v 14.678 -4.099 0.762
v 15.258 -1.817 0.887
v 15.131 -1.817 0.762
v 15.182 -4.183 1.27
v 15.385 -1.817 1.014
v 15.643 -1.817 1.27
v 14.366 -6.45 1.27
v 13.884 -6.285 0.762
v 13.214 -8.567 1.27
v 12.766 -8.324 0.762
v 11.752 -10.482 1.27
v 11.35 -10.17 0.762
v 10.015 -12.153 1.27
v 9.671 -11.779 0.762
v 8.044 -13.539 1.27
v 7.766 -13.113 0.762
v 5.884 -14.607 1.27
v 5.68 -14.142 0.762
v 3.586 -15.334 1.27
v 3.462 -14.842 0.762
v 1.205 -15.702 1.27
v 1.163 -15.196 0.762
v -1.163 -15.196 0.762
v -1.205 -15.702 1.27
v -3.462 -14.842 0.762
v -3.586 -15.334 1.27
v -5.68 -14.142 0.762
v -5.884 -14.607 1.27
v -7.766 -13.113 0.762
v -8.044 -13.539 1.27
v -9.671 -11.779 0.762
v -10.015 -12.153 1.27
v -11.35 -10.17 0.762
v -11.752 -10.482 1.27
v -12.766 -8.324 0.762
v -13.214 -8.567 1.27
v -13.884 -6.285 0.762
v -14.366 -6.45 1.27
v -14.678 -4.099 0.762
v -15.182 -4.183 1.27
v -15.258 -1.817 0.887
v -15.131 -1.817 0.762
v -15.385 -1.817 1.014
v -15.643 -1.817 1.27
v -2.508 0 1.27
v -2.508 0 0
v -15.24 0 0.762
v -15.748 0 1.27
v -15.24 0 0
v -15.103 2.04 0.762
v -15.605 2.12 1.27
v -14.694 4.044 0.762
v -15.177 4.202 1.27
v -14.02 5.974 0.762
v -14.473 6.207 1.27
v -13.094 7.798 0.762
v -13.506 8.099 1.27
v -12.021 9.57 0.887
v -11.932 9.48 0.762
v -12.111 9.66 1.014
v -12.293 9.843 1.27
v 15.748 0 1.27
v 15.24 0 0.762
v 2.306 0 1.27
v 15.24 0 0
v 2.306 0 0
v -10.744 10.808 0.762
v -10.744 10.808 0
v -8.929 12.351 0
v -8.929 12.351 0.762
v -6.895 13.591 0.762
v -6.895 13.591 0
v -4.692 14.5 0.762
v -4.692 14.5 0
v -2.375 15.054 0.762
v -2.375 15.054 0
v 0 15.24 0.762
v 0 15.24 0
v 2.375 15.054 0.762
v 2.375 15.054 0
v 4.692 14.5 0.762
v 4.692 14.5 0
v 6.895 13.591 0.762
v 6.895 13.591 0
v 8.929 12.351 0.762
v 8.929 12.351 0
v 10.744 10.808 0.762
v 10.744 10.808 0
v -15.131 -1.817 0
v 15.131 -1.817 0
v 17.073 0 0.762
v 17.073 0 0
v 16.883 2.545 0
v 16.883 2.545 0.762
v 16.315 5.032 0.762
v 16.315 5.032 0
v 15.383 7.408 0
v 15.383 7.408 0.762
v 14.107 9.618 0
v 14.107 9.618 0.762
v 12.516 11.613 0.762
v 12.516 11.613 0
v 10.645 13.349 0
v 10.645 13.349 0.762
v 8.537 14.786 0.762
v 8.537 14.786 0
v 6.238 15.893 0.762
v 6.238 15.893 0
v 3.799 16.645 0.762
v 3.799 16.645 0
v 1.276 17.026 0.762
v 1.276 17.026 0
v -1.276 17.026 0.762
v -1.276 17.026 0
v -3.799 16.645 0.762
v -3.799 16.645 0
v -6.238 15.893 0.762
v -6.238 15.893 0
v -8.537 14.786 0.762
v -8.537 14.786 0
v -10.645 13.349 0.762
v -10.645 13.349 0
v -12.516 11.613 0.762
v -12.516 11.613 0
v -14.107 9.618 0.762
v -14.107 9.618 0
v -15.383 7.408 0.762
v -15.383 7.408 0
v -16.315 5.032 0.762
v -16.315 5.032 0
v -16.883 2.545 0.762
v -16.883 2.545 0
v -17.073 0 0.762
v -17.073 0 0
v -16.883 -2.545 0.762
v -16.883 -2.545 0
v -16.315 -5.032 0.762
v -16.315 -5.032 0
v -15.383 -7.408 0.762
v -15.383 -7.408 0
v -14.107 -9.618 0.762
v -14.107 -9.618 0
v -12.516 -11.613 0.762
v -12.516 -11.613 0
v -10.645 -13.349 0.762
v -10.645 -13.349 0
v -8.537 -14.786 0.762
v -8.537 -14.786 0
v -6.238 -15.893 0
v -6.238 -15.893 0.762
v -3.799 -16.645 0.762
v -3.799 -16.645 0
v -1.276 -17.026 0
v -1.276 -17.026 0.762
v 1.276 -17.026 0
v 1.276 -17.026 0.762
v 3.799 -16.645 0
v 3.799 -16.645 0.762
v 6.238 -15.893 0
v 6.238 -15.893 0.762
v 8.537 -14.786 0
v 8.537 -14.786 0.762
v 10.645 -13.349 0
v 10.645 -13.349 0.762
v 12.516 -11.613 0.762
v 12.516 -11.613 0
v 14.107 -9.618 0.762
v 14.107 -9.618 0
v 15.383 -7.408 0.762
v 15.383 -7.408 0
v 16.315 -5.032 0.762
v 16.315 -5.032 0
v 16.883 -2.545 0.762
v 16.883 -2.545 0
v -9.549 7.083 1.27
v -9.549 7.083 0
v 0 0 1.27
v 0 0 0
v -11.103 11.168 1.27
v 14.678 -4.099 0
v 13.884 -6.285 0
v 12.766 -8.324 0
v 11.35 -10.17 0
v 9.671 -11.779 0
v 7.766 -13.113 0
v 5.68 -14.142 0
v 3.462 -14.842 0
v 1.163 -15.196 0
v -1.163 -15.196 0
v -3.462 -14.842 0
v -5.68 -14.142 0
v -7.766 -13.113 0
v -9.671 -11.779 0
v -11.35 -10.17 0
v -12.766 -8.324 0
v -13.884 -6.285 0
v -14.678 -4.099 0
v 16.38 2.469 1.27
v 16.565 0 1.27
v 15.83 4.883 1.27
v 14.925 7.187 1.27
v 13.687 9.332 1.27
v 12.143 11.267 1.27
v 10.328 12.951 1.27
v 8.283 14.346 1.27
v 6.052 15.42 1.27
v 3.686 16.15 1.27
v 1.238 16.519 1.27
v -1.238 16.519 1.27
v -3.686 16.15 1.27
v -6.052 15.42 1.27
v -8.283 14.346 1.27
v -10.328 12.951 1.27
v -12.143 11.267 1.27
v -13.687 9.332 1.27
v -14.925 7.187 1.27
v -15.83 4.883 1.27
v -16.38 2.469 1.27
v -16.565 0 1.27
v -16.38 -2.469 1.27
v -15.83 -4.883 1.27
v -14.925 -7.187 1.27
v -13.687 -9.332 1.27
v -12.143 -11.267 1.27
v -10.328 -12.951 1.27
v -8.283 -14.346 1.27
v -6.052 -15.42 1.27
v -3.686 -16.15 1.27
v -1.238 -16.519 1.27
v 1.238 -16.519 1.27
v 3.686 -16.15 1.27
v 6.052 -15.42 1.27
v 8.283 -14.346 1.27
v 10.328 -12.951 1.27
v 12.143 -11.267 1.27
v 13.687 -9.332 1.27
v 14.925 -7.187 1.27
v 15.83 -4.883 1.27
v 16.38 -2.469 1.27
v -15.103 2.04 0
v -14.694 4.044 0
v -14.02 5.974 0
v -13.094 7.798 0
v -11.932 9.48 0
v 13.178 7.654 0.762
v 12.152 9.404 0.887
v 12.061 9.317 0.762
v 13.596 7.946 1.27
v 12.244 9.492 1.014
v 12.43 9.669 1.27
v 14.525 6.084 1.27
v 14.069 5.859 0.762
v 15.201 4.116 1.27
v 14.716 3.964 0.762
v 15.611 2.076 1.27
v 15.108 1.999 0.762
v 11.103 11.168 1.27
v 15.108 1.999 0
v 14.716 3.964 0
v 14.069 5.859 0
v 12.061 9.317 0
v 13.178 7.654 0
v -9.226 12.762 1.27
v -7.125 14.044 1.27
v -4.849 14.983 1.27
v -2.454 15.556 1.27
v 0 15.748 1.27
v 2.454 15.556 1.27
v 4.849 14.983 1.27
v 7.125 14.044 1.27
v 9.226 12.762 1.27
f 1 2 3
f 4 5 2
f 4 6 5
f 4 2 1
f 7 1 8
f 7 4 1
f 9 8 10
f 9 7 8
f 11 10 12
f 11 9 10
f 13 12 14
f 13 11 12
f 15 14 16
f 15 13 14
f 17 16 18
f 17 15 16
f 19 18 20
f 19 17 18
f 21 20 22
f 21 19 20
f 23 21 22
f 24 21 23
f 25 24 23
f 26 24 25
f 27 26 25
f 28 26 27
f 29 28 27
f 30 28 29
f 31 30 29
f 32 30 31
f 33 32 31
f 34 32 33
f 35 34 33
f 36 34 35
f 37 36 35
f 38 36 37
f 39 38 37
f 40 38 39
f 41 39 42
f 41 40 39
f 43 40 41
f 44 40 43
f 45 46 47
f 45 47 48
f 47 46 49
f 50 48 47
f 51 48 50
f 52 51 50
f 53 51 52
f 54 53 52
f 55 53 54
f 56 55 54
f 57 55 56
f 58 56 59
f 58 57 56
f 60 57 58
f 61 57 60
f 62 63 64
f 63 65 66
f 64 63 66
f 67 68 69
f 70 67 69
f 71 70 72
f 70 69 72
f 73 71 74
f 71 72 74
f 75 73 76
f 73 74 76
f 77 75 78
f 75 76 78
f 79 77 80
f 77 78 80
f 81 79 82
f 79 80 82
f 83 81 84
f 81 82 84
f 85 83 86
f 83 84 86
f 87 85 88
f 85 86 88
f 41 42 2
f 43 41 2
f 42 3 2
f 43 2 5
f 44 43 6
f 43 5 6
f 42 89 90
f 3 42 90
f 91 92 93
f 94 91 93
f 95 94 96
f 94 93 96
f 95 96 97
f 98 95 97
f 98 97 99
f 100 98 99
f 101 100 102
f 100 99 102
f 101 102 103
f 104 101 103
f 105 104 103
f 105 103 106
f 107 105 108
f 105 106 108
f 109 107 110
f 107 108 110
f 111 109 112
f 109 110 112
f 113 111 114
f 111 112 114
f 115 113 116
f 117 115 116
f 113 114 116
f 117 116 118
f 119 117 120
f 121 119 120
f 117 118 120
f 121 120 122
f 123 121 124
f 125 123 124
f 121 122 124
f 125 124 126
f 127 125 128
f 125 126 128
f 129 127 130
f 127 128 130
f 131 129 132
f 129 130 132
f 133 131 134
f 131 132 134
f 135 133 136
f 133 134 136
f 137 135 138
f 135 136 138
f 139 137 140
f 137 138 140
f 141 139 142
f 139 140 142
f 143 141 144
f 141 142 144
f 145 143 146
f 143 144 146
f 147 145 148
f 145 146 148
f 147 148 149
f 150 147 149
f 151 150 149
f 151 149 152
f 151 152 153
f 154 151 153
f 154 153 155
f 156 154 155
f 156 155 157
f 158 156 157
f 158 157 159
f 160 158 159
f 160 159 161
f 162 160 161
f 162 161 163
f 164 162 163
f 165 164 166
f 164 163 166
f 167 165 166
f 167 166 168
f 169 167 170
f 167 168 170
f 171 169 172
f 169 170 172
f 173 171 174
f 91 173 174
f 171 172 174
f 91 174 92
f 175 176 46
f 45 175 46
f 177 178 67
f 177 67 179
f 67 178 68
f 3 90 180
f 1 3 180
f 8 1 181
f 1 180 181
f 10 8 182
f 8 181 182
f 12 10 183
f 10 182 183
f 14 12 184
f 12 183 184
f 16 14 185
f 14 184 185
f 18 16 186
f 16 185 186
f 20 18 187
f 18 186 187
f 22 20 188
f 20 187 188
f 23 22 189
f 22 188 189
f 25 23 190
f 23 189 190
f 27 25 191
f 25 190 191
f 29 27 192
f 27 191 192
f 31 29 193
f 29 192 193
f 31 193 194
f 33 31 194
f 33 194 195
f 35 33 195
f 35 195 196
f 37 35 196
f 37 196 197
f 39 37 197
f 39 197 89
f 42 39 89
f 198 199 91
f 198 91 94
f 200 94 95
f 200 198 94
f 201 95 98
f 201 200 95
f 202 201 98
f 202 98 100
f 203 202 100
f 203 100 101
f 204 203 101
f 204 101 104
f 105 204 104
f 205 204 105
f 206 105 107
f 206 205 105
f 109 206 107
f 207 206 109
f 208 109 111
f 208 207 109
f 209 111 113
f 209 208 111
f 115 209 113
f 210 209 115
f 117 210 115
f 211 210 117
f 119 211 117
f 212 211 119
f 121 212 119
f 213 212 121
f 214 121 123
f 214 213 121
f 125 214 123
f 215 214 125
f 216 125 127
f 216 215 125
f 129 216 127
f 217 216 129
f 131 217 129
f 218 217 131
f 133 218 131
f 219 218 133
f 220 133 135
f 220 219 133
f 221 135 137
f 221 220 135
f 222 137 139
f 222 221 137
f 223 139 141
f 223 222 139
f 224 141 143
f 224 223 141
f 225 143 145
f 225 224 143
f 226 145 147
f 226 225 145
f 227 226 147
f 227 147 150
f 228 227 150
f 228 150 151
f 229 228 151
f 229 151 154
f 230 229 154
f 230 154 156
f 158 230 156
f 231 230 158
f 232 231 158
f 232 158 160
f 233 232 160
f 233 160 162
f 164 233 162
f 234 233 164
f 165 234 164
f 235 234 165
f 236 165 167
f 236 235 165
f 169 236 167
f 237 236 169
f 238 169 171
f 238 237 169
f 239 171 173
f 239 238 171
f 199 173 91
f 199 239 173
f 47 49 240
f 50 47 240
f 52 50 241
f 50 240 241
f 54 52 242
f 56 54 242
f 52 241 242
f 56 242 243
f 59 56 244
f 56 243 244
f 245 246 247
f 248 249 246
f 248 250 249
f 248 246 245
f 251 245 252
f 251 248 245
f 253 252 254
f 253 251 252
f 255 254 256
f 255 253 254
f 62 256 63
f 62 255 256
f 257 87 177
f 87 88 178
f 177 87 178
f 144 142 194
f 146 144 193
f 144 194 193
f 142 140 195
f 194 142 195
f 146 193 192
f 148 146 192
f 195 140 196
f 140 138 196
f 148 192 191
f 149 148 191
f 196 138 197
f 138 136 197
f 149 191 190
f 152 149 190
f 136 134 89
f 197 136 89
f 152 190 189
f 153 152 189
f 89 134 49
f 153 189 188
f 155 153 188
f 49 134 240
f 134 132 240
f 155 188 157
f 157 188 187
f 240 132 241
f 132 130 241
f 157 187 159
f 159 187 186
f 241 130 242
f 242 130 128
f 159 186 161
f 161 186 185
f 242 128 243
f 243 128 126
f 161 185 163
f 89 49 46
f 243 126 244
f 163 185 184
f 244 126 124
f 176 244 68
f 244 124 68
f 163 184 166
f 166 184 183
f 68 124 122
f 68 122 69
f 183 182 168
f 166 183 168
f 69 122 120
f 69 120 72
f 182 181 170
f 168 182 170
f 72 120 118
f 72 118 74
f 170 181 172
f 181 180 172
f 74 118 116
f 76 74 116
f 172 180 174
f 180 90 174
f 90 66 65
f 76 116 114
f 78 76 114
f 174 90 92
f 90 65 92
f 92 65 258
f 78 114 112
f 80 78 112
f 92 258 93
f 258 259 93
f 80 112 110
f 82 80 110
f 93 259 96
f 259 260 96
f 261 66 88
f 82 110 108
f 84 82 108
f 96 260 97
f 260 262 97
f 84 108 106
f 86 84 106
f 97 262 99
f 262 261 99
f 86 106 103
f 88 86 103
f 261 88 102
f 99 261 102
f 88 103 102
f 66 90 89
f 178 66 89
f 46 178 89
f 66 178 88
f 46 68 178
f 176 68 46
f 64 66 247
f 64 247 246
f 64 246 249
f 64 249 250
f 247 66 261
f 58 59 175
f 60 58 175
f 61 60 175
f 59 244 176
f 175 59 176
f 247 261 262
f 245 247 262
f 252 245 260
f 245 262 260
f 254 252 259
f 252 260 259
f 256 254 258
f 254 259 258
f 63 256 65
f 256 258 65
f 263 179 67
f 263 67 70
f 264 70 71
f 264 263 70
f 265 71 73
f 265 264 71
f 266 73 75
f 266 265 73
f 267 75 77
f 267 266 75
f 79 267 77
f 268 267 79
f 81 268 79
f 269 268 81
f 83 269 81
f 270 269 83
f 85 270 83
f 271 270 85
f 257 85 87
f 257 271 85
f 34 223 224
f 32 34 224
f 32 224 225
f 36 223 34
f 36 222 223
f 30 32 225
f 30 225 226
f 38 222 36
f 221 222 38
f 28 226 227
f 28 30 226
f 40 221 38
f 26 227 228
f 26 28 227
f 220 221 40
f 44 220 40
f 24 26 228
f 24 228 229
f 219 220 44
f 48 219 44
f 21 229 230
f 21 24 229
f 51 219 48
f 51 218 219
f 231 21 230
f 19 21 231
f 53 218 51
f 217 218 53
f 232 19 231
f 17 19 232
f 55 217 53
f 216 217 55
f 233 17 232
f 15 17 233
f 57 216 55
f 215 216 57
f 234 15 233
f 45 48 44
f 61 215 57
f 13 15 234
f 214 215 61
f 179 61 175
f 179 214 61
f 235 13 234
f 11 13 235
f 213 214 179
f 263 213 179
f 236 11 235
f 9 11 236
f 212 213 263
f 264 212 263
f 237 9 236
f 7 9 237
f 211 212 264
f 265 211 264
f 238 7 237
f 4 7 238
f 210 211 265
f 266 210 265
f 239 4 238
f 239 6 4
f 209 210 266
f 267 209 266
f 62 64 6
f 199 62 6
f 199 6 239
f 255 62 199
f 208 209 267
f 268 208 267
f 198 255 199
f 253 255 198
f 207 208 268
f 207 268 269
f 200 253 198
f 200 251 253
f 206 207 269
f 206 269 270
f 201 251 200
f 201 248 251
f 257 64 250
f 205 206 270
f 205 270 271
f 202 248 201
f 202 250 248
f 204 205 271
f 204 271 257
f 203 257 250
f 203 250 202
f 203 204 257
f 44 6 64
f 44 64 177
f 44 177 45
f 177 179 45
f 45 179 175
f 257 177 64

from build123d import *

# Parameters (mm, degrees)
F0_R     = 17.0734697504
F1_DEPTH = 1.27
F2_SIZE  = 0.508


with BuildPart() as f1:
    # F0 (on Top) → F1 (new body)
    with BuildSketch(Plane.XY):
        Circle(F0_R)
        with BuildLine():
            ThreePointArc((12.0605428134, 9.3167004378), (14.4232498501, 4.9221401608), (15.24, 0))
            ThreePointArc((15.24, 0), (15.2127889804, -0.9103029381), (15.131253092, -1.8173551845))
            ThreePointArc((15.131253092, -1.8173551845), (0, -15.24), (-15.131253092, -1.8173551845))
            ThreePointArc((-15.131253092, -1.8173551845), (-15.2127889804, -0.9103029381), (-15.24, 0))
            ThreePointArc((-15.24, 0), (-14.3893350592, 5.0204219498), (-11.9323049141, 9.4803849835))
            ThreePointArc((-11.9323049141, 9.4803849835), (-11.3577782125, 10.1616176898), (-10.7444158345, 10.8081047541))
            ThreePointArc((-10.7444158345, 10.8081047541), (0, 15.24), (10.7444158345, 10.8081047541))
            ThreePointArc((10.7444158345, 10.8081047541), (11.4268371145, 10.0838977364), (12.0605428134, 9.3167004378))
        make_face(mode=Mode.SUBTRACT)
        with BuildLine():
            Line((-2.5077849958, 0), (0, 0))
            Line((0, 0), (-10.7444158345, 10.8081047541))
            ThreePointArc((-10.7444158345, 10.8081047541), (-11.3577782125, 10.1616176898), (-11.9323049141, 9.4803849835))
            Line((-11.9323049141, 9.4803849835), (-9.5489449564, 7.0828973502))
            Line((-9.5489449564, 7.0828973502), (-2.5077849958, 0))
        make_face()
        with BuildLine():
            Line((2.306102775, 0), (12.0605428134, 9.3167004378))
            ThreePointArc((12.0605428134, 9.3167004378), (11.4268371145, 10.0838977364), (10.7444158345, 10.8081047541))
            Line((10.7444158345, 10.8081047541), (0, 0))
            Line((0, 0), (2.306102775, 0))
        make_face()
        with BuildLine():
            ThreePointArc((15.131253092, -1.8173551845), (15.2127889804, -0.9103029381), (15.24, 0))
            Line((15.24, 0), (2.306102775, 0))
            Line((2.306102775, 0), (0, 0))
            Line((0, 0), (-2.5077849958, 0))
            Line((-2.5077849958, 0), (-15.24, 0))
            ThreePointArc((-15.24, 0), (-15.2127889804, -0.9103029381), (-15.131253092, -1.8173551845))
            Line((-15.131253092, -1.8173551845), (15.131253092, -1.8173551845))
        make_face()
    extrude(amount=F1_DEPTH)

    # F2
    f2_edges = [f1.edges().sort_by_distance(p)[0] for p in [
        (-17.07347, 0, 1.27),
        (0, -15.24, 1.27),
        (-14.389335, 5.020422, 1.27),
        (0, 15.24, 1.27),
        (14.42325, 4.92214, 1.27),
    ]]
    chamfer(f2_edges, length=F2_SIZE)


solid = f1.part
